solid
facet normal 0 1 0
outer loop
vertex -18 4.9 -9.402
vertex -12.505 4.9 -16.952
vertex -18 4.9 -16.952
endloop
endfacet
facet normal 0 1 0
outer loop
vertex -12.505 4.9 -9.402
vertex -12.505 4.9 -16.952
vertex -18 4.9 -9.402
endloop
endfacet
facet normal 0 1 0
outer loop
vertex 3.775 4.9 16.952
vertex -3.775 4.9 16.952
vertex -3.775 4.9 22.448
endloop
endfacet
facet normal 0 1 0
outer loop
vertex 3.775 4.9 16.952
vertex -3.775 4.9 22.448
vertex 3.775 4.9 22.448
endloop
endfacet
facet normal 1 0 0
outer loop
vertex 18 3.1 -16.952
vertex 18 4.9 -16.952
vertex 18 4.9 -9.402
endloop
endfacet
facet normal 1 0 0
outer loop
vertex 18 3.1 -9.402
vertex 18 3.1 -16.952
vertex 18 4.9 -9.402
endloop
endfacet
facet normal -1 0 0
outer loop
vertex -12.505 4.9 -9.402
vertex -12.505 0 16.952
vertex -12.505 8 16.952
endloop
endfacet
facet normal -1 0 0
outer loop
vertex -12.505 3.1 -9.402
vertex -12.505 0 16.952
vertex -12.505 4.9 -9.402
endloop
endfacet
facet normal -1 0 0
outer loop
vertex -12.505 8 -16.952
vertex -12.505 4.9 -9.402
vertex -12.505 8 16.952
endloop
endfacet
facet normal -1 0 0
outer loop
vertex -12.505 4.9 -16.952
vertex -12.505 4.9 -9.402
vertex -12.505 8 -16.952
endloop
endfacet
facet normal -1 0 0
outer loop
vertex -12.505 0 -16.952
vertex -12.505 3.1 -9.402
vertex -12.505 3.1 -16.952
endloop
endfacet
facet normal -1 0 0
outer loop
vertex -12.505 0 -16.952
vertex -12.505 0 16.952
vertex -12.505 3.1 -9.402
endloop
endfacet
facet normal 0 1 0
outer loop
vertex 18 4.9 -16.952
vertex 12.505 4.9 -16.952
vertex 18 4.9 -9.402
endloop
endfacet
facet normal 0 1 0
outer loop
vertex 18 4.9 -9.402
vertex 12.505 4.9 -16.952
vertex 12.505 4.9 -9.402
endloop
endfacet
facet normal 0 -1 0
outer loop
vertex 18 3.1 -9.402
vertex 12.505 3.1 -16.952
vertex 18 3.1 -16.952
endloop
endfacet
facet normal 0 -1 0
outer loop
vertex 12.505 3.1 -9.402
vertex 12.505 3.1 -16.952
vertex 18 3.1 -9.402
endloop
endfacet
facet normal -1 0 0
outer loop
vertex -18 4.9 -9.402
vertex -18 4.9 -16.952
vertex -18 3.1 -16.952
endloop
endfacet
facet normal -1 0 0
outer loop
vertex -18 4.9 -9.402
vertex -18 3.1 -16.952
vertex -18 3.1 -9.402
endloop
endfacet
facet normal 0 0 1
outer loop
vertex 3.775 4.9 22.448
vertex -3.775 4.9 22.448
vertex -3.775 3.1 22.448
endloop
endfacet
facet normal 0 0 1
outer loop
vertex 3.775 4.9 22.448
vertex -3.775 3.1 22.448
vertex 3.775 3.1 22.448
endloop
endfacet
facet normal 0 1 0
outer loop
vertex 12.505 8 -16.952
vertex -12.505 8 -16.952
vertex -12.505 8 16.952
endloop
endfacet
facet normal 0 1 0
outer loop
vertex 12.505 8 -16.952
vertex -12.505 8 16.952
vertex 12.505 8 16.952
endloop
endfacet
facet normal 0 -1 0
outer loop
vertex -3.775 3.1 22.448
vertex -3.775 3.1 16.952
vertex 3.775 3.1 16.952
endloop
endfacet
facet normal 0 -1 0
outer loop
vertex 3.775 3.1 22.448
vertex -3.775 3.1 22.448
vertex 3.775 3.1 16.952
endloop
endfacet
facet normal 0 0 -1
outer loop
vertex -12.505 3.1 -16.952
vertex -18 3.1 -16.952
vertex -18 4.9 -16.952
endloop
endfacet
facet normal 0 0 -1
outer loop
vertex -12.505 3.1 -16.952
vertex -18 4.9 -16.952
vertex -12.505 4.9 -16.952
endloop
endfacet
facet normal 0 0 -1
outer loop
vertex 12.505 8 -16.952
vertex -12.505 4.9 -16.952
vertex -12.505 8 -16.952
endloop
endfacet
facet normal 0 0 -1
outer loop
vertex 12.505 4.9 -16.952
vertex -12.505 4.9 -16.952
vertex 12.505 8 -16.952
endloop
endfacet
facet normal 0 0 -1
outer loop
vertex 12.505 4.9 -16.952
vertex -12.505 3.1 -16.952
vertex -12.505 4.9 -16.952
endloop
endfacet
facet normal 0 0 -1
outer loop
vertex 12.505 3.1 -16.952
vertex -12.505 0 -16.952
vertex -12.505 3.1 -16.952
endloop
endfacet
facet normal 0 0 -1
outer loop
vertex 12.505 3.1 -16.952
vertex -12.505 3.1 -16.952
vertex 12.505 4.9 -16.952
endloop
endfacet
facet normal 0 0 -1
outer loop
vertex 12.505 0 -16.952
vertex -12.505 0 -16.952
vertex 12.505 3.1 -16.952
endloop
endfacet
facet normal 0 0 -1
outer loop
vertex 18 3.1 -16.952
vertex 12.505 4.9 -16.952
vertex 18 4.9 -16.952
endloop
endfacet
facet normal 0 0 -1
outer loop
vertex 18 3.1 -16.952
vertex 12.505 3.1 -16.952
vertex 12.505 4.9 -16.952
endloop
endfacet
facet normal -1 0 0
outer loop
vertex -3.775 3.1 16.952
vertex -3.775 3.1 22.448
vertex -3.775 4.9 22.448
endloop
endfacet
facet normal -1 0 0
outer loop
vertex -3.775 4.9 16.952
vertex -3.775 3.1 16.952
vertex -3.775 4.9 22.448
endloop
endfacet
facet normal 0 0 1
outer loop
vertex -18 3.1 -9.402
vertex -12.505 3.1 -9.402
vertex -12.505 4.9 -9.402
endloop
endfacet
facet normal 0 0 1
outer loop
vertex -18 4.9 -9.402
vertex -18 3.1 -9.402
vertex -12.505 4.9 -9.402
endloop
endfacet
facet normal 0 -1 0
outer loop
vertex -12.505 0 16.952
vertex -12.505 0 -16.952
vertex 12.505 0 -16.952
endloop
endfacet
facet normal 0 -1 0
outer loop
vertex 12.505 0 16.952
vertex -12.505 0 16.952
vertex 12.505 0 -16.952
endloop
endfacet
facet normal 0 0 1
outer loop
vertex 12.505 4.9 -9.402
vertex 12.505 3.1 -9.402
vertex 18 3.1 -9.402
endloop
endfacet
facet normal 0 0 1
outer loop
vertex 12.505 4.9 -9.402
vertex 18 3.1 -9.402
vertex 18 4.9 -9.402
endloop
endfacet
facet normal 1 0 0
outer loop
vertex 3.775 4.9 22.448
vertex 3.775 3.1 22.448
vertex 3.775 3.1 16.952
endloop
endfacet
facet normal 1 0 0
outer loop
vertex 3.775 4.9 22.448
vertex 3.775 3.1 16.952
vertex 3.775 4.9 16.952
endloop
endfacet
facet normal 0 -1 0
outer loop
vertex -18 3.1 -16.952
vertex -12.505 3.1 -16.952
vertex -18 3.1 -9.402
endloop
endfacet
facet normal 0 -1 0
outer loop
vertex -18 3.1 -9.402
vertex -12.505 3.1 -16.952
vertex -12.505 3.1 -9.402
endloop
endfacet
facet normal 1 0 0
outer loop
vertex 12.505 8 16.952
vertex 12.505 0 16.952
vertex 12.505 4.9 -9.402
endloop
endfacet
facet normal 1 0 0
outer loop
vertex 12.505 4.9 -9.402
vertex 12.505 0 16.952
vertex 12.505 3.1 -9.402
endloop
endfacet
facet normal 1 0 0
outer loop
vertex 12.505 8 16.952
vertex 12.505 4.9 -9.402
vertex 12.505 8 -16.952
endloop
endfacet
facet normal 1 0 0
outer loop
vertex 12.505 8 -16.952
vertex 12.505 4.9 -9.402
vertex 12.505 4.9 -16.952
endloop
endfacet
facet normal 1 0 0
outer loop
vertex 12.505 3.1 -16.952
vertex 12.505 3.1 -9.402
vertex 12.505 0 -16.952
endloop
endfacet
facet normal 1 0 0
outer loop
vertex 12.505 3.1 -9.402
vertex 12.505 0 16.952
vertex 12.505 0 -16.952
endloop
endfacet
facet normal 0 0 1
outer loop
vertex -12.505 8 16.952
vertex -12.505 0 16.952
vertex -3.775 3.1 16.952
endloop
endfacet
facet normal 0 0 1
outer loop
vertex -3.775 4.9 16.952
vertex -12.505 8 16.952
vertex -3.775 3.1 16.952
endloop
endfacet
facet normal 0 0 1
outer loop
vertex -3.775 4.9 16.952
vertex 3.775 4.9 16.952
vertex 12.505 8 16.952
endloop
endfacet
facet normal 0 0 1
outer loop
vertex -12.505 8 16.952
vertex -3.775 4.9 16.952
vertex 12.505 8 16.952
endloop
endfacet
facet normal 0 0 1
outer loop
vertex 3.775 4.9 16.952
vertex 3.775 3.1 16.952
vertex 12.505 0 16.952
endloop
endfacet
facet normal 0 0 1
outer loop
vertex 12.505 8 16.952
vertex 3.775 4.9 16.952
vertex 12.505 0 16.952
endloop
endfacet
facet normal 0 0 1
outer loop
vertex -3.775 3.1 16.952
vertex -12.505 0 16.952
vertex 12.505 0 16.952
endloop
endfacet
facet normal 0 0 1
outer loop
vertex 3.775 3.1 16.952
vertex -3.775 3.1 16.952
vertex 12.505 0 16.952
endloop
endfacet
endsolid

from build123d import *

# Parameters (mm, degrees)
SKETCH1_W           = 25.01
SKETCH1_H           = 33.905
BOSS_EXTRUDE1_DEPTH = 8
SKETCH2_W           = 7.55
SKETCH2_H           = 1.8
BOSS_EXTRUDE2_DEPTH = 5.495
SKETCH3_W           = 7.55
SKETCH3_H           = 1.8
BOSS_EXTRUDE3_DEPTH = 5.495


with BuildPart() as part:
    # Sketch1 → Boss-Extrude1 (new body)
    with BuildSketch(Plane(origin=(0, 0, 0), x_dir=(1, 0, 0), z_dir=(0, 1, 0))):
        Rectangle(SKETCH1_W, SKETCH1_H)
    extrude(amount=BOSS_EXTRUDE1_DEPTH)

    # Sketch2 → Boss-Extrude2 (add)
    with BuildSketch(Plane.XY.offset(16.9525)):
        with Locations((0, 4)):
            Rectangle(SKETCH2_W, SKETCH2_H)
    extrude(amount=BOSS_EXTRUDE2_DEPTH)

    # Sketch3 → Boss-Extrude3 (add)
    with BuildSketch(Plane.ZY.offset(12.505)):
        with Locations((-13.1775, 4)):
            Rectangle(SKETCH3_W, SKETCH3_H)
    boss_extrude3 = extrude(amount=BOSS_EXTRUDE3_DEPTH)

    # Mirror2: Boss-Extrude3 across plane
    add(boss_extrude3.mirror(Plane(origin=(0, 0, 0), x_dir=(0, 0, 1), z_dir=(1, 0, 0))))


solid = part.part
